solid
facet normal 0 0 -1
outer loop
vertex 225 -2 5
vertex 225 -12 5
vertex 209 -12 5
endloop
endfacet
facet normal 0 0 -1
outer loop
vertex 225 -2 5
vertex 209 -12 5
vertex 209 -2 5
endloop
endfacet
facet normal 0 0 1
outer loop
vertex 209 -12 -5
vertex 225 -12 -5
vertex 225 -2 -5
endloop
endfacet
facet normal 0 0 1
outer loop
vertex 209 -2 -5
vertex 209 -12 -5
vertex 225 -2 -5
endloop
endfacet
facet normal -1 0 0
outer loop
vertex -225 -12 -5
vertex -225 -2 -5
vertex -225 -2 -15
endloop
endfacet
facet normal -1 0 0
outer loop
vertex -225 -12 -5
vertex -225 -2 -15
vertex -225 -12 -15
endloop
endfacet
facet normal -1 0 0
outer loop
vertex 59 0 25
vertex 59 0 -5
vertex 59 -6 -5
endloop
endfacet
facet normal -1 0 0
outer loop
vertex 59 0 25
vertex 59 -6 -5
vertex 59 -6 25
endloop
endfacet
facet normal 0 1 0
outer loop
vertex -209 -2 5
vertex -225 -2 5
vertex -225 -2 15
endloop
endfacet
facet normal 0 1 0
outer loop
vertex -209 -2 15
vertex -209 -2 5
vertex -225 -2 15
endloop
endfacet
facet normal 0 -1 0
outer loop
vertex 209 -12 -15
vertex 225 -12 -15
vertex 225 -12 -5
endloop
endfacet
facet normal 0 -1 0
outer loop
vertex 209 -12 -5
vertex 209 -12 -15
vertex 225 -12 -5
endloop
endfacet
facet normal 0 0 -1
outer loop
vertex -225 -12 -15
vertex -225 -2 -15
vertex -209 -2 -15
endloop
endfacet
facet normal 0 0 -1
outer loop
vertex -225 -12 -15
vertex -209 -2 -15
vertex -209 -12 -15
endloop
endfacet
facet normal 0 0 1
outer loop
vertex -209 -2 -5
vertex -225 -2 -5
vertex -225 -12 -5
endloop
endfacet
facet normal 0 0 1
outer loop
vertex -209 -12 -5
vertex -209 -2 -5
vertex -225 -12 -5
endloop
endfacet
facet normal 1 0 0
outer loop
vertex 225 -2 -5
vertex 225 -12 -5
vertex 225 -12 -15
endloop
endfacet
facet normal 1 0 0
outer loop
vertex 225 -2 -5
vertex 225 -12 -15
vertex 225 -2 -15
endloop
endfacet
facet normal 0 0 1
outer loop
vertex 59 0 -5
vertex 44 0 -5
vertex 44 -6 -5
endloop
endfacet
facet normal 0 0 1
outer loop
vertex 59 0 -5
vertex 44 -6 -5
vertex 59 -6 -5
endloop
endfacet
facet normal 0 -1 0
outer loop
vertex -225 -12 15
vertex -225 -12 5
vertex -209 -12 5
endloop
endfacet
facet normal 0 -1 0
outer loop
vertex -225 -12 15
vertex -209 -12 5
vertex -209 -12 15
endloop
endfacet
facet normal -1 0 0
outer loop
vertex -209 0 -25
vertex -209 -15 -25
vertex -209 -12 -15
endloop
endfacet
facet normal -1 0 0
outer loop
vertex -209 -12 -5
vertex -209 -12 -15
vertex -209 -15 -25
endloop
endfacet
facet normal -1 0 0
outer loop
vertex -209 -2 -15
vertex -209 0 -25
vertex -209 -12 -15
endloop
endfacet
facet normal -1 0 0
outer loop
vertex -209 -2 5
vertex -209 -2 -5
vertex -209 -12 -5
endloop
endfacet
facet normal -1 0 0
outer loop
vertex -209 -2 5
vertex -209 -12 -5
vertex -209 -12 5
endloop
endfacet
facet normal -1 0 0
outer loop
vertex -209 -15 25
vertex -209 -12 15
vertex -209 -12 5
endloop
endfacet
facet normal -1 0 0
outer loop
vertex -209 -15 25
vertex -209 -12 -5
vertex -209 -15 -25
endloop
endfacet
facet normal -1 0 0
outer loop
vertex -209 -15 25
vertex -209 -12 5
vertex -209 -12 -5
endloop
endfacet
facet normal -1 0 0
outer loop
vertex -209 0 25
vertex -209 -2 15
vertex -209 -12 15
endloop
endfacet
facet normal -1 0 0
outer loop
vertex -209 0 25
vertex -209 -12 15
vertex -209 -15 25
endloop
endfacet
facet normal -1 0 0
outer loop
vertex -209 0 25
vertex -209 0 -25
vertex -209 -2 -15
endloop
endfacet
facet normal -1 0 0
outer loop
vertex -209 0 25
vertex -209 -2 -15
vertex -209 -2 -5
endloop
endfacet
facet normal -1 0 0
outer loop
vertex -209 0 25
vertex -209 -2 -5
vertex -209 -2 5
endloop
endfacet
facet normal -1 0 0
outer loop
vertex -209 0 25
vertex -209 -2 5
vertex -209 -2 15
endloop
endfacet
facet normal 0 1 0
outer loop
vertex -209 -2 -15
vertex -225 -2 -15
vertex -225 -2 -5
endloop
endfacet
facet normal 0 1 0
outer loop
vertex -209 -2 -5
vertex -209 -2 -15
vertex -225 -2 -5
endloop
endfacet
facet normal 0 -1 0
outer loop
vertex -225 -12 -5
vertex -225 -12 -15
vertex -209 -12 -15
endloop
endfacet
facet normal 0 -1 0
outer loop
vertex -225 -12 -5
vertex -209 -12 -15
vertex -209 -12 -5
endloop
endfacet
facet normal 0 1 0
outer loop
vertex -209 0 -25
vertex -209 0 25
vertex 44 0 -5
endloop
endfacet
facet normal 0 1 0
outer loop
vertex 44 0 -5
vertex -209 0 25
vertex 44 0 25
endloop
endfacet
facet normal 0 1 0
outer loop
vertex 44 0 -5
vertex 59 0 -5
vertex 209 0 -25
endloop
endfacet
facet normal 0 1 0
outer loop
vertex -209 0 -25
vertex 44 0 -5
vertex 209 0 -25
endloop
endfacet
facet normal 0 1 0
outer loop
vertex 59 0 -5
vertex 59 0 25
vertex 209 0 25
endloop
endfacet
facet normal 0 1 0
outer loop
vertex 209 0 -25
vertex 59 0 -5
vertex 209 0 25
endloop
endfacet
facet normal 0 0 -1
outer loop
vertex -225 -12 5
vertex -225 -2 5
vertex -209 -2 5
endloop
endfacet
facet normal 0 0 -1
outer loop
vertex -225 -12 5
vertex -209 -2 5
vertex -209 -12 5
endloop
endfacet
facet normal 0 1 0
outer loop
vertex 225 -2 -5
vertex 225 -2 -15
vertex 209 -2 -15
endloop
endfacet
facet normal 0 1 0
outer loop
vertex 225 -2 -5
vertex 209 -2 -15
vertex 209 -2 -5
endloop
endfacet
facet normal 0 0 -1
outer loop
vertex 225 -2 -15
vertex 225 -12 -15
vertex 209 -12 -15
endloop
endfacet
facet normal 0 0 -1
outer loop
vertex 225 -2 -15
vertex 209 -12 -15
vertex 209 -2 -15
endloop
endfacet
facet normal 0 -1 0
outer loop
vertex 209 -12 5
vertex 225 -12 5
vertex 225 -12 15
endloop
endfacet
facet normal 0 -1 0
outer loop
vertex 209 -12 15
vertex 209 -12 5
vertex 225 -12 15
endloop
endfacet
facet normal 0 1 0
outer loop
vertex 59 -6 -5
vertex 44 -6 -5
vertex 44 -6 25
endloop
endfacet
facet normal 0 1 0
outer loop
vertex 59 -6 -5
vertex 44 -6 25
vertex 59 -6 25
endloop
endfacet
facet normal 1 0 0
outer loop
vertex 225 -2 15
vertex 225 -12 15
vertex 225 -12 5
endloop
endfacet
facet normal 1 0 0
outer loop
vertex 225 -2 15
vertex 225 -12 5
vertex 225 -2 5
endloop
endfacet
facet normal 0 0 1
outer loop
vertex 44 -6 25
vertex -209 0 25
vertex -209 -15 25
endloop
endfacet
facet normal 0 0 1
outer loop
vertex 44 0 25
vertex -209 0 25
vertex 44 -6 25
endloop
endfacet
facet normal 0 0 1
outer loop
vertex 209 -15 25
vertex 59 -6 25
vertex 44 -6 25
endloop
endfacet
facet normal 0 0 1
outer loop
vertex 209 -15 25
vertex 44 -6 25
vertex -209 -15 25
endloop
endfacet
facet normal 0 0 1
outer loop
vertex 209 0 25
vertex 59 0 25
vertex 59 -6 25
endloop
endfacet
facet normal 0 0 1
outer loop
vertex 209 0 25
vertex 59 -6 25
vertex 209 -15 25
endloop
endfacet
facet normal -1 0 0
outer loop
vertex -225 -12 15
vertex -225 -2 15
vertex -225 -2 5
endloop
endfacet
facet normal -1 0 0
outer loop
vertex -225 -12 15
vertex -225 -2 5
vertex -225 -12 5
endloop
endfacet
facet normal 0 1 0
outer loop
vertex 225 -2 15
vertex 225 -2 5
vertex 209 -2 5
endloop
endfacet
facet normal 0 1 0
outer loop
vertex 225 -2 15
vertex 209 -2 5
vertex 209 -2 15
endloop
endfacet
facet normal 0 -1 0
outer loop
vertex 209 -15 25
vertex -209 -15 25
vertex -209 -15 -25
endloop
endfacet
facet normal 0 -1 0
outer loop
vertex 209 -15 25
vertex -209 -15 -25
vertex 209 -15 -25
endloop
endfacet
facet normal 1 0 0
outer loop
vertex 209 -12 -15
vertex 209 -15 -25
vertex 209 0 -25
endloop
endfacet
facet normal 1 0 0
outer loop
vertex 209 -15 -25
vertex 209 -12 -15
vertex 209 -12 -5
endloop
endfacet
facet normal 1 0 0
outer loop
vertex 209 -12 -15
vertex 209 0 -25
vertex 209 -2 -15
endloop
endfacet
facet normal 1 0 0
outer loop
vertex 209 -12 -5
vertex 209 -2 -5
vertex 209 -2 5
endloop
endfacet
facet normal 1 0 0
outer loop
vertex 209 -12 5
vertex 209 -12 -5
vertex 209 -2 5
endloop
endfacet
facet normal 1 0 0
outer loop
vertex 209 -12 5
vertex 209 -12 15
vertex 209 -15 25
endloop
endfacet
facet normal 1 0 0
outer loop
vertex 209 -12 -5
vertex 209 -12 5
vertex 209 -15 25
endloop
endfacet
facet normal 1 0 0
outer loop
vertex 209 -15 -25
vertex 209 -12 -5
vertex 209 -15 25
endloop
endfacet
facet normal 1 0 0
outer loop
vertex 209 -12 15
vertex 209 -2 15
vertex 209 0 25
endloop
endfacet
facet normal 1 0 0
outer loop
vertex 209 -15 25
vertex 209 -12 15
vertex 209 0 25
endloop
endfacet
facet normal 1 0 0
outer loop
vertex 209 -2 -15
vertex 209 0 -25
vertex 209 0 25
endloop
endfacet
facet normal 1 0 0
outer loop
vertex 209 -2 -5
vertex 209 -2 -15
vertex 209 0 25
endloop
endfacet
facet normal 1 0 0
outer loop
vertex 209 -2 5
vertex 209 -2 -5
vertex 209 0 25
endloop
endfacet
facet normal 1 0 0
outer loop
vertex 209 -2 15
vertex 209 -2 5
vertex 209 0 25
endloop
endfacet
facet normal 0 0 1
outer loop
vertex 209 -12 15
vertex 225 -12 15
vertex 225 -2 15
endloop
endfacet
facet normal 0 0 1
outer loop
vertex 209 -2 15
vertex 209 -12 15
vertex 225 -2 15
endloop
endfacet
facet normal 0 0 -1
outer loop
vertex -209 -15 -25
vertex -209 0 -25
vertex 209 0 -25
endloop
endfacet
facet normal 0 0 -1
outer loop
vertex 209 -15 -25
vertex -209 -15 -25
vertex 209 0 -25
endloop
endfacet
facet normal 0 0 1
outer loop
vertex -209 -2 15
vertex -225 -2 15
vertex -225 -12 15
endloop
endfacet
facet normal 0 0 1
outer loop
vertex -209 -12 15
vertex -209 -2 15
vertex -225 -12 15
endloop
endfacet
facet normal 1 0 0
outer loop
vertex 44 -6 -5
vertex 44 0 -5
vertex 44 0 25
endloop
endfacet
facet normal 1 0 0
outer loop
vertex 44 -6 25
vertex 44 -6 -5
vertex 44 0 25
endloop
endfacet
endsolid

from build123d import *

# Parameters (mm, degrees)
F0_W     = 418
F0_H     = 50
F1_DEPTH = 15
F2_W     = 10
F2_H     = 10
F3_DEPTH = 16
F4_W     = 10
F4_H     = 10
F5_DEPTH = 16
F6_W     = 15
F6_H     = 30
F7_DEPTH = 6


# Not quite as in the source:
# - a feature names something its author has since deleted; it is built from what else it names


with BuildPart() as f1:
    # F0 (on Front) → F1 (new body)
    with BuildSketch(Plane.XZ):
        Rectangle(F0_W, F0_H)
    extrude(amount=F1_DEPTH)

    # F2 (on face) → F3 (join)
    with BuildSketch(Plane.YZ.offset(209)):
        with Locations((-7, 10)):
            Rectangle(F2_W, F2_H)
        with Locations((-7, -10)):
            Rectangle(F2_W, F2_H)
    extrude(amount=F3_DEPTH)

    # F4 (on face) → F5 (join)
    with BuildSketch(Plane(origin=(-209, 0, 0), x_dir=(0, -1, 0), z_dir=(-1, 0, 0))):
        with Locations((7, 10)):
            Rectangle(F4_W, F4_H)
        with Locations((7, -10)):
            Rectangle(F4_W, F4_H)
    extrude(amount=F5_DEPTH)

    # F6 (on face) → F7 (cut)
    with BuildSketch(Plane.XZ):
        with Locations((51.5, 10)):
            Rectangle(F6_W, F6_H)
    extrude(amount=F7_DEPTH, mode=Mode.SUBTRACT)


solid = f1.part
